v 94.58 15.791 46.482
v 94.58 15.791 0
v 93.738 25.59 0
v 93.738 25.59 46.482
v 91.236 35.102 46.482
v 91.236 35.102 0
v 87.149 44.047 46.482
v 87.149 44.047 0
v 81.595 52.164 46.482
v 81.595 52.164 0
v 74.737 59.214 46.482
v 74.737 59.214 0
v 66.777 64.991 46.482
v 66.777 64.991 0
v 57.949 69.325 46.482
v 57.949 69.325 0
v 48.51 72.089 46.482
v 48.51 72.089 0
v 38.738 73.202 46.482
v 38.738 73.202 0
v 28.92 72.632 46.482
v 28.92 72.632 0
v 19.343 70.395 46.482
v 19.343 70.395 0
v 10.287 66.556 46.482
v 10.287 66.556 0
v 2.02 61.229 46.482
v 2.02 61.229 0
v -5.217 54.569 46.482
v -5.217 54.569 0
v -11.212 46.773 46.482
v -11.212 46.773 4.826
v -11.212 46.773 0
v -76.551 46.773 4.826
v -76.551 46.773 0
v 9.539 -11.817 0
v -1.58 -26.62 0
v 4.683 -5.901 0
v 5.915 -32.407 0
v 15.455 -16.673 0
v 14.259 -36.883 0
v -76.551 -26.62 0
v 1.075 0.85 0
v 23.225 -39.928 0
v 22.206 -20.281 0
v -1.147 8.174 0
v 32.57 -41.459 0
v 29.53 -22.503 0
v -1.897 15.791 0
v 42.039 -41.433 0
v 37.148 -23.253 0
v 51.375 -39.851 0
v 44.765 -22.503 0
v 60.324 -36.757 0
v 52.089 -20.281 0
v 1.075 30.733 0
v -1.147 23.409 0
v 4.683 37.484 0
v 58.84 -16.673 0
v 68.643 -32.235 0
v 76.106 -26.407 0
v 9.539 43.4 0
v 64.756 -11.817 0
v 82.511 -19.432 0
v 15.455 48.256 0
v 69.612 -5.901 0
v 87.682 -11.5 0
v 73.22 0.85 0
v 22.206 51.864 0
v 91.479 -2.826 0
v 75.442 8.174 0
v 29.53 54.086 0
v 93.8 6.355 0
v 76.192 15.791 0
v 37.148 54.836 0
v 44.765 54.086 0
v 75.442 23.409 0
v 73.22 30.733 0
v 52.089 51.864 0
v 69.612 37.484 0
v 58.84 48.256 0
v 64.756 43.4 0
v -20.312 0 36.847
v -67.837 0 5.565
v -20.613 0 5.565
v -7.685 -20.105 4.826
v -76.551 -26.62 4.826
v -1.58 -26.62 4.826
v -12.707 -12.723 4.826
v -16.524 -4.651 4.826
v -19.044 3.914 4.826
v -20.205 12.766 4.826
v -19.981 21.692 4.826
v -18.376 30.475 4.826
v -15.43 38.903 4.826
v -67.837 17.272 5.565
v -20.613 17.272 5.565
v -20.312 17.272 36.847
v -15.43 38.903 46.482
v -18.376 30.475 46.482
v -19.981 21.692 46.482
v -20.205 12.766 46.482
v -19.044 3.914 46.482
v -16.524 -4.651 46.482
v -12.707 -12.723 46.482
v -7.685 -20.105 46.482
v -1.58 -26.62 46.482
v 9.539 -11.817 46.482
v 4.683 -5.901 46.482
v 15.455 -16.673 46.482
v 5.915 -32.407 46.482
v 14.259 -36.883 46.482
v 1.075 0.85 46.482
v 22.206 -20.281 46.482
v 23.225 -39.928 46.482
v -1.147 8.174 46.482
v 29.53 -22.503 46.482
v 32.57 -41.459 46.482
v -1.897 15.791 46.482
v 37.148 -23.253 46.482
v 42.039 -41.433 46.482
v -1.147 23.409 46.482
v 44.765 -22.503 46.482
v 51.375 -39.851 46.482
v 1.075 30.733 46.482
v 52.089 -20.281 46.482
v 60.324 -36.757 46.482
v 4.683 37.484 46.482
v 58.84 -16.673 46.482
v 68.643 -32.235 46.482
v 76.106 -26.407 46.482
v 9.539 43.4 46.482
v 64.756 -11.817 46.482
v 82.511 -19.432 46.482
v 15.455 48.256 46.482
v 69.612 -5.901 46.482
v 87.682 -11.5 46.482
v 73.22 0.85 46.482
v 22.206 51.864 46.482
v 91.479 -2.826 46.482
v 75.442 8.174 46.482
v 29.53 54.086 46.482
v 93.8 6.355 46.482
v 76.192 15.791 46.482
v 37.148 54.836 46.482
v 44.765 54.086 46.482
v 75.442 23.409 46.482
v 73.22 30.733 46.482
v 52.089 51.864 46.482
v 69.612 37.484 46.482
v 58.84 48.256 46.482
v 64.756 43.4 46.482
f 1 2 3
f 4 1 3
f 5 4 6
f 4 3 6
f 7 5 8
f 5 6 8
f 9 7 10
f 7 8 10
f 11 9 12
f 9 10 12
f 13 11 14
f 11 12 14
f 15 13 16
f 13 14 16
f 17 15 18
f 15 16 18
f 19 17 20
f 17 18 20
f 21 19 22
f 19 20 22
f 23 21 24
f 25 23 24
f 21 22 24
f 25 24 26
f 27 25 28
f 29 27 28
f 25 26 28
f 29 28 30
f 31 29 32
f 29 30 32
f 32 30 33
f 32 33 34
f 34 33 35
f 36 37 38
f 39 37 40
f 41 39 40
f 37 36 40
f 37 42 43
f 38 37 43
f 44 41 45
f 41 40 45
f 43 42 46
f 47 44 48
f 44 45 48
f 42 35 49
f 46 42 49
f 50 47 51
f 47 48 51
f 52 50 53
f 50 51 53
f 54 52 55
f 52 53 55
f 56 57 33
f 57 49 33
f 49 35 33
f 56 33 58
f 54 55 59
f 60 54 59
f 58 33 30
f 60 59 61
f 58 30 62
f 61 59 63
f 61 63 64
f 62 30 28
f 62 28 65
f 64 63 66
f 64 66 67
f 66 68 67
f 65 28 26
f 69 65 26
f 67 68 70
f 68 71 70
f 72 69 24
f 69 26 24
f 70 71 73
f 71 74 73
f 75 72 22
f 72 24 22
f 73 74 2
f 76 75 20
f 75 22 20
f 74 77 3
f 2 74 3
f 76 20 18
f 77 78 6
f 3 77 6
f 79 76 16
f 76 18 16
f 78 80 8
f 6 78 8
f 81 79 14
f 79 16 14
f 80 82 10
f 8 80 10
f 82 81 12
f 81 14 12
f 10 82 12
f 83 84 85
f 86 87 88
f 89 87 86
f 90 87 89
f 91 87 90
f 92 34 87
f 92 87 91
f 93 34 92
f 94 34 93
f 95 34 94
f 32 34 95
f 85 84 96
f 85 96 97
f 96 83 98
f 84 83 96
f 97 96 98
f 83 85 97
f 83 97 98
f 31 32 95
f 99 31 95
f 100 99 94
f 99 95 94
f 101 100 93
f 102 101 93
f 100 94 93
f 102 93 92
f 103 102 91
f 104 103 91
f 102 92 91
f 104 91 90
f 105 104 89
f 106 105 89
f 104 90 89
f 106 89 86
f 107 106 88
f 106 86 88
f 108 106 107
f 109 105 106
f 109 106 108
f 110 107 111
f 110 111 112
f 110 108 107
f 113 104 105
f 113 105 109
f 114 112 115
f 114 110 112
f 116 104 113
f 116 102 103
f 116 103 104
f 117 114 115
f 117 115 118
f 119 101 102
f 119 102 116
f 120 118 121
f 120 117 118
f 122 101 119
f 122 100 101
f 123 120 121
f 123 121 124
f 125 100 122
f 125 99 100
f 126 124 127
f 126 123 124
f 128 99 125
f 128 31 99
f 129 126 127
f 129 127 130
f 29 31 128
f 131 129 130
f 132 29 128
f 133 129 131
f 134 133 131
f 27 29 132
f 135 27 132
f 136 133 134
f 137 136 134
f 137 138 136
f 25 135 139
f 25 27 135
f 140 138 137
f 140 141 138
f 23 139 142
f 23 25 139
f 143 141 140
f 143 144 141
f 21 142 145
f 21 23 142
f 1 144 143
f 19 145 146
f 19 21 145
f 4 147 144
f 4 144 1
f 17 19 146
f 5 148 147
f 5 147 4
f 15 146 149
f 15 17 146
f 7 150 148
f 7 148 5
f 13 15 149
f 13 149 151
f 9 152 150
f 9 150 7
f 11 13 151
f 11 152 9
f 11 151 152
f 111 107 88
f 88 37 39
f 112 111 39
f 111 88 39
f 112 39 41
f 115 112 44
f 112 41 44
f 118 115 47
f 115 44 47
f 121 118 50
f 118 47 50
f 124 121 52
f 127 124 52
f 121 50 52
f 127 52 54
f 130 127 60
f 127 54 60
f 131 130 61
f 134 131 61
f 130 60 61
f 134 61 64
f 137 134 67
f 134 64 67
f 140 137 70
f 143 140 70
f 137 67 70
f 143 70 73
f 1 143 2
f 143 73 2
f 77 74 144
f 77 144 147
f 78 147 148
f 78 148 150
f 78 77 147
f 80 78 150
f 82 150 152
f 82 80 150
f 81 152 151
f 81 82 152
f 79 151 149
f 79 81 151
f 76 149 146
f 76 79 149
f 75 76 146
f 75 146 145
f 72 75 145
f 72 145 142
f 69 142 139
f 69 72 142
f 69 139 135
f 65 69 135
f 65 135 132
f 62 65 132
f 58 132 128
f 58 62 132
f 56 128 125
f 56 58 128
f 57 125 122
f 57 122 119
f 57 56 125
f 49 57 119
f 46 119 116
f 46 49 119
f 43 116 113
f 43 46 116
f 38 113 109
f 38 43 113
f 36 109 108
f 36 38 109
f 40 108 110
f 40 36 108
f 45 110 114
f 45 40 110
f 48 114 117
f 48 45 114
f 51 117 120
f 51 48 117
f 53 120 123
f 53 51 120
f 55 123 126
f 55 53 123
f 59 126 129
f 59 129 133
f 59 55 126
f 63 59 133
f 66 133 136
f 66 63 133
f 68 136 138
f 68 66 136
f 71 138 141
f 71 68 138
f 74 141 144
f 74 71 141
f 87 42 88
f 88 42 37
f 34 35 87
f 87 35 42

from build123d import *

# Parameters (mm, degrees)
F0_R     = 39.044747
F1_DEPTH = 46.482
F2_DEPTH = 4.826
F4_DEPTH = 17.272


with BuildPart() as f1:
    # F0 (on Top) → F1 (new body)
    with BuildSketch(Plane.XY):
        with BuildLine():
            ThreePointArc((94.580177, 15.791448), (53.288747, 70.909251), (-11.212295, 46.772763))
            ThreePointArc((-11.212295, 46.772763), (-19.796801, 8.317612), (-1.579646, -26.61987))
            ThreePointArc((-1.579646, -26.61987), (60.324089, -36.757176), (94.580177, 15.791448))
        make_face()
        with Locations((37.147503, 15.791448)):
            Circle(F0_R, mode=Mode.SUBTRACT)
    extrude(amount=F1_DEPTH)

    # F0 (on Top) → F2 (join)
    with BuildSketch(Plane.XY):
        with BuildLine():
            Line((-11.212295, 46.772763), (-76.550923, 46.772763))
            Line((-76.550923, 46.772763), (-76.550923, -26.61987))
            Line((-76.550923, -26.61987), (-1.579646, -26.61987))
            ThreePointArc((-1.579646, -26.61987), (-19.796801, 8.317612), (-11.212295, 46.772763))
        make_face()
    extrude(amount=F2_DEPTH)


with BuildPart() as f4:
    # F3 (on Front) → F4 (new body)
    with BuildSketch(Plane.XZ):
        Polygon((-20.613138, 5.564605), (-20.312348, 36.846712), (-67.837089, 5.564605), align=None)
    extrude(amount=-F4_DEPTH)


solid = Compound([f1.part, f4.part])
